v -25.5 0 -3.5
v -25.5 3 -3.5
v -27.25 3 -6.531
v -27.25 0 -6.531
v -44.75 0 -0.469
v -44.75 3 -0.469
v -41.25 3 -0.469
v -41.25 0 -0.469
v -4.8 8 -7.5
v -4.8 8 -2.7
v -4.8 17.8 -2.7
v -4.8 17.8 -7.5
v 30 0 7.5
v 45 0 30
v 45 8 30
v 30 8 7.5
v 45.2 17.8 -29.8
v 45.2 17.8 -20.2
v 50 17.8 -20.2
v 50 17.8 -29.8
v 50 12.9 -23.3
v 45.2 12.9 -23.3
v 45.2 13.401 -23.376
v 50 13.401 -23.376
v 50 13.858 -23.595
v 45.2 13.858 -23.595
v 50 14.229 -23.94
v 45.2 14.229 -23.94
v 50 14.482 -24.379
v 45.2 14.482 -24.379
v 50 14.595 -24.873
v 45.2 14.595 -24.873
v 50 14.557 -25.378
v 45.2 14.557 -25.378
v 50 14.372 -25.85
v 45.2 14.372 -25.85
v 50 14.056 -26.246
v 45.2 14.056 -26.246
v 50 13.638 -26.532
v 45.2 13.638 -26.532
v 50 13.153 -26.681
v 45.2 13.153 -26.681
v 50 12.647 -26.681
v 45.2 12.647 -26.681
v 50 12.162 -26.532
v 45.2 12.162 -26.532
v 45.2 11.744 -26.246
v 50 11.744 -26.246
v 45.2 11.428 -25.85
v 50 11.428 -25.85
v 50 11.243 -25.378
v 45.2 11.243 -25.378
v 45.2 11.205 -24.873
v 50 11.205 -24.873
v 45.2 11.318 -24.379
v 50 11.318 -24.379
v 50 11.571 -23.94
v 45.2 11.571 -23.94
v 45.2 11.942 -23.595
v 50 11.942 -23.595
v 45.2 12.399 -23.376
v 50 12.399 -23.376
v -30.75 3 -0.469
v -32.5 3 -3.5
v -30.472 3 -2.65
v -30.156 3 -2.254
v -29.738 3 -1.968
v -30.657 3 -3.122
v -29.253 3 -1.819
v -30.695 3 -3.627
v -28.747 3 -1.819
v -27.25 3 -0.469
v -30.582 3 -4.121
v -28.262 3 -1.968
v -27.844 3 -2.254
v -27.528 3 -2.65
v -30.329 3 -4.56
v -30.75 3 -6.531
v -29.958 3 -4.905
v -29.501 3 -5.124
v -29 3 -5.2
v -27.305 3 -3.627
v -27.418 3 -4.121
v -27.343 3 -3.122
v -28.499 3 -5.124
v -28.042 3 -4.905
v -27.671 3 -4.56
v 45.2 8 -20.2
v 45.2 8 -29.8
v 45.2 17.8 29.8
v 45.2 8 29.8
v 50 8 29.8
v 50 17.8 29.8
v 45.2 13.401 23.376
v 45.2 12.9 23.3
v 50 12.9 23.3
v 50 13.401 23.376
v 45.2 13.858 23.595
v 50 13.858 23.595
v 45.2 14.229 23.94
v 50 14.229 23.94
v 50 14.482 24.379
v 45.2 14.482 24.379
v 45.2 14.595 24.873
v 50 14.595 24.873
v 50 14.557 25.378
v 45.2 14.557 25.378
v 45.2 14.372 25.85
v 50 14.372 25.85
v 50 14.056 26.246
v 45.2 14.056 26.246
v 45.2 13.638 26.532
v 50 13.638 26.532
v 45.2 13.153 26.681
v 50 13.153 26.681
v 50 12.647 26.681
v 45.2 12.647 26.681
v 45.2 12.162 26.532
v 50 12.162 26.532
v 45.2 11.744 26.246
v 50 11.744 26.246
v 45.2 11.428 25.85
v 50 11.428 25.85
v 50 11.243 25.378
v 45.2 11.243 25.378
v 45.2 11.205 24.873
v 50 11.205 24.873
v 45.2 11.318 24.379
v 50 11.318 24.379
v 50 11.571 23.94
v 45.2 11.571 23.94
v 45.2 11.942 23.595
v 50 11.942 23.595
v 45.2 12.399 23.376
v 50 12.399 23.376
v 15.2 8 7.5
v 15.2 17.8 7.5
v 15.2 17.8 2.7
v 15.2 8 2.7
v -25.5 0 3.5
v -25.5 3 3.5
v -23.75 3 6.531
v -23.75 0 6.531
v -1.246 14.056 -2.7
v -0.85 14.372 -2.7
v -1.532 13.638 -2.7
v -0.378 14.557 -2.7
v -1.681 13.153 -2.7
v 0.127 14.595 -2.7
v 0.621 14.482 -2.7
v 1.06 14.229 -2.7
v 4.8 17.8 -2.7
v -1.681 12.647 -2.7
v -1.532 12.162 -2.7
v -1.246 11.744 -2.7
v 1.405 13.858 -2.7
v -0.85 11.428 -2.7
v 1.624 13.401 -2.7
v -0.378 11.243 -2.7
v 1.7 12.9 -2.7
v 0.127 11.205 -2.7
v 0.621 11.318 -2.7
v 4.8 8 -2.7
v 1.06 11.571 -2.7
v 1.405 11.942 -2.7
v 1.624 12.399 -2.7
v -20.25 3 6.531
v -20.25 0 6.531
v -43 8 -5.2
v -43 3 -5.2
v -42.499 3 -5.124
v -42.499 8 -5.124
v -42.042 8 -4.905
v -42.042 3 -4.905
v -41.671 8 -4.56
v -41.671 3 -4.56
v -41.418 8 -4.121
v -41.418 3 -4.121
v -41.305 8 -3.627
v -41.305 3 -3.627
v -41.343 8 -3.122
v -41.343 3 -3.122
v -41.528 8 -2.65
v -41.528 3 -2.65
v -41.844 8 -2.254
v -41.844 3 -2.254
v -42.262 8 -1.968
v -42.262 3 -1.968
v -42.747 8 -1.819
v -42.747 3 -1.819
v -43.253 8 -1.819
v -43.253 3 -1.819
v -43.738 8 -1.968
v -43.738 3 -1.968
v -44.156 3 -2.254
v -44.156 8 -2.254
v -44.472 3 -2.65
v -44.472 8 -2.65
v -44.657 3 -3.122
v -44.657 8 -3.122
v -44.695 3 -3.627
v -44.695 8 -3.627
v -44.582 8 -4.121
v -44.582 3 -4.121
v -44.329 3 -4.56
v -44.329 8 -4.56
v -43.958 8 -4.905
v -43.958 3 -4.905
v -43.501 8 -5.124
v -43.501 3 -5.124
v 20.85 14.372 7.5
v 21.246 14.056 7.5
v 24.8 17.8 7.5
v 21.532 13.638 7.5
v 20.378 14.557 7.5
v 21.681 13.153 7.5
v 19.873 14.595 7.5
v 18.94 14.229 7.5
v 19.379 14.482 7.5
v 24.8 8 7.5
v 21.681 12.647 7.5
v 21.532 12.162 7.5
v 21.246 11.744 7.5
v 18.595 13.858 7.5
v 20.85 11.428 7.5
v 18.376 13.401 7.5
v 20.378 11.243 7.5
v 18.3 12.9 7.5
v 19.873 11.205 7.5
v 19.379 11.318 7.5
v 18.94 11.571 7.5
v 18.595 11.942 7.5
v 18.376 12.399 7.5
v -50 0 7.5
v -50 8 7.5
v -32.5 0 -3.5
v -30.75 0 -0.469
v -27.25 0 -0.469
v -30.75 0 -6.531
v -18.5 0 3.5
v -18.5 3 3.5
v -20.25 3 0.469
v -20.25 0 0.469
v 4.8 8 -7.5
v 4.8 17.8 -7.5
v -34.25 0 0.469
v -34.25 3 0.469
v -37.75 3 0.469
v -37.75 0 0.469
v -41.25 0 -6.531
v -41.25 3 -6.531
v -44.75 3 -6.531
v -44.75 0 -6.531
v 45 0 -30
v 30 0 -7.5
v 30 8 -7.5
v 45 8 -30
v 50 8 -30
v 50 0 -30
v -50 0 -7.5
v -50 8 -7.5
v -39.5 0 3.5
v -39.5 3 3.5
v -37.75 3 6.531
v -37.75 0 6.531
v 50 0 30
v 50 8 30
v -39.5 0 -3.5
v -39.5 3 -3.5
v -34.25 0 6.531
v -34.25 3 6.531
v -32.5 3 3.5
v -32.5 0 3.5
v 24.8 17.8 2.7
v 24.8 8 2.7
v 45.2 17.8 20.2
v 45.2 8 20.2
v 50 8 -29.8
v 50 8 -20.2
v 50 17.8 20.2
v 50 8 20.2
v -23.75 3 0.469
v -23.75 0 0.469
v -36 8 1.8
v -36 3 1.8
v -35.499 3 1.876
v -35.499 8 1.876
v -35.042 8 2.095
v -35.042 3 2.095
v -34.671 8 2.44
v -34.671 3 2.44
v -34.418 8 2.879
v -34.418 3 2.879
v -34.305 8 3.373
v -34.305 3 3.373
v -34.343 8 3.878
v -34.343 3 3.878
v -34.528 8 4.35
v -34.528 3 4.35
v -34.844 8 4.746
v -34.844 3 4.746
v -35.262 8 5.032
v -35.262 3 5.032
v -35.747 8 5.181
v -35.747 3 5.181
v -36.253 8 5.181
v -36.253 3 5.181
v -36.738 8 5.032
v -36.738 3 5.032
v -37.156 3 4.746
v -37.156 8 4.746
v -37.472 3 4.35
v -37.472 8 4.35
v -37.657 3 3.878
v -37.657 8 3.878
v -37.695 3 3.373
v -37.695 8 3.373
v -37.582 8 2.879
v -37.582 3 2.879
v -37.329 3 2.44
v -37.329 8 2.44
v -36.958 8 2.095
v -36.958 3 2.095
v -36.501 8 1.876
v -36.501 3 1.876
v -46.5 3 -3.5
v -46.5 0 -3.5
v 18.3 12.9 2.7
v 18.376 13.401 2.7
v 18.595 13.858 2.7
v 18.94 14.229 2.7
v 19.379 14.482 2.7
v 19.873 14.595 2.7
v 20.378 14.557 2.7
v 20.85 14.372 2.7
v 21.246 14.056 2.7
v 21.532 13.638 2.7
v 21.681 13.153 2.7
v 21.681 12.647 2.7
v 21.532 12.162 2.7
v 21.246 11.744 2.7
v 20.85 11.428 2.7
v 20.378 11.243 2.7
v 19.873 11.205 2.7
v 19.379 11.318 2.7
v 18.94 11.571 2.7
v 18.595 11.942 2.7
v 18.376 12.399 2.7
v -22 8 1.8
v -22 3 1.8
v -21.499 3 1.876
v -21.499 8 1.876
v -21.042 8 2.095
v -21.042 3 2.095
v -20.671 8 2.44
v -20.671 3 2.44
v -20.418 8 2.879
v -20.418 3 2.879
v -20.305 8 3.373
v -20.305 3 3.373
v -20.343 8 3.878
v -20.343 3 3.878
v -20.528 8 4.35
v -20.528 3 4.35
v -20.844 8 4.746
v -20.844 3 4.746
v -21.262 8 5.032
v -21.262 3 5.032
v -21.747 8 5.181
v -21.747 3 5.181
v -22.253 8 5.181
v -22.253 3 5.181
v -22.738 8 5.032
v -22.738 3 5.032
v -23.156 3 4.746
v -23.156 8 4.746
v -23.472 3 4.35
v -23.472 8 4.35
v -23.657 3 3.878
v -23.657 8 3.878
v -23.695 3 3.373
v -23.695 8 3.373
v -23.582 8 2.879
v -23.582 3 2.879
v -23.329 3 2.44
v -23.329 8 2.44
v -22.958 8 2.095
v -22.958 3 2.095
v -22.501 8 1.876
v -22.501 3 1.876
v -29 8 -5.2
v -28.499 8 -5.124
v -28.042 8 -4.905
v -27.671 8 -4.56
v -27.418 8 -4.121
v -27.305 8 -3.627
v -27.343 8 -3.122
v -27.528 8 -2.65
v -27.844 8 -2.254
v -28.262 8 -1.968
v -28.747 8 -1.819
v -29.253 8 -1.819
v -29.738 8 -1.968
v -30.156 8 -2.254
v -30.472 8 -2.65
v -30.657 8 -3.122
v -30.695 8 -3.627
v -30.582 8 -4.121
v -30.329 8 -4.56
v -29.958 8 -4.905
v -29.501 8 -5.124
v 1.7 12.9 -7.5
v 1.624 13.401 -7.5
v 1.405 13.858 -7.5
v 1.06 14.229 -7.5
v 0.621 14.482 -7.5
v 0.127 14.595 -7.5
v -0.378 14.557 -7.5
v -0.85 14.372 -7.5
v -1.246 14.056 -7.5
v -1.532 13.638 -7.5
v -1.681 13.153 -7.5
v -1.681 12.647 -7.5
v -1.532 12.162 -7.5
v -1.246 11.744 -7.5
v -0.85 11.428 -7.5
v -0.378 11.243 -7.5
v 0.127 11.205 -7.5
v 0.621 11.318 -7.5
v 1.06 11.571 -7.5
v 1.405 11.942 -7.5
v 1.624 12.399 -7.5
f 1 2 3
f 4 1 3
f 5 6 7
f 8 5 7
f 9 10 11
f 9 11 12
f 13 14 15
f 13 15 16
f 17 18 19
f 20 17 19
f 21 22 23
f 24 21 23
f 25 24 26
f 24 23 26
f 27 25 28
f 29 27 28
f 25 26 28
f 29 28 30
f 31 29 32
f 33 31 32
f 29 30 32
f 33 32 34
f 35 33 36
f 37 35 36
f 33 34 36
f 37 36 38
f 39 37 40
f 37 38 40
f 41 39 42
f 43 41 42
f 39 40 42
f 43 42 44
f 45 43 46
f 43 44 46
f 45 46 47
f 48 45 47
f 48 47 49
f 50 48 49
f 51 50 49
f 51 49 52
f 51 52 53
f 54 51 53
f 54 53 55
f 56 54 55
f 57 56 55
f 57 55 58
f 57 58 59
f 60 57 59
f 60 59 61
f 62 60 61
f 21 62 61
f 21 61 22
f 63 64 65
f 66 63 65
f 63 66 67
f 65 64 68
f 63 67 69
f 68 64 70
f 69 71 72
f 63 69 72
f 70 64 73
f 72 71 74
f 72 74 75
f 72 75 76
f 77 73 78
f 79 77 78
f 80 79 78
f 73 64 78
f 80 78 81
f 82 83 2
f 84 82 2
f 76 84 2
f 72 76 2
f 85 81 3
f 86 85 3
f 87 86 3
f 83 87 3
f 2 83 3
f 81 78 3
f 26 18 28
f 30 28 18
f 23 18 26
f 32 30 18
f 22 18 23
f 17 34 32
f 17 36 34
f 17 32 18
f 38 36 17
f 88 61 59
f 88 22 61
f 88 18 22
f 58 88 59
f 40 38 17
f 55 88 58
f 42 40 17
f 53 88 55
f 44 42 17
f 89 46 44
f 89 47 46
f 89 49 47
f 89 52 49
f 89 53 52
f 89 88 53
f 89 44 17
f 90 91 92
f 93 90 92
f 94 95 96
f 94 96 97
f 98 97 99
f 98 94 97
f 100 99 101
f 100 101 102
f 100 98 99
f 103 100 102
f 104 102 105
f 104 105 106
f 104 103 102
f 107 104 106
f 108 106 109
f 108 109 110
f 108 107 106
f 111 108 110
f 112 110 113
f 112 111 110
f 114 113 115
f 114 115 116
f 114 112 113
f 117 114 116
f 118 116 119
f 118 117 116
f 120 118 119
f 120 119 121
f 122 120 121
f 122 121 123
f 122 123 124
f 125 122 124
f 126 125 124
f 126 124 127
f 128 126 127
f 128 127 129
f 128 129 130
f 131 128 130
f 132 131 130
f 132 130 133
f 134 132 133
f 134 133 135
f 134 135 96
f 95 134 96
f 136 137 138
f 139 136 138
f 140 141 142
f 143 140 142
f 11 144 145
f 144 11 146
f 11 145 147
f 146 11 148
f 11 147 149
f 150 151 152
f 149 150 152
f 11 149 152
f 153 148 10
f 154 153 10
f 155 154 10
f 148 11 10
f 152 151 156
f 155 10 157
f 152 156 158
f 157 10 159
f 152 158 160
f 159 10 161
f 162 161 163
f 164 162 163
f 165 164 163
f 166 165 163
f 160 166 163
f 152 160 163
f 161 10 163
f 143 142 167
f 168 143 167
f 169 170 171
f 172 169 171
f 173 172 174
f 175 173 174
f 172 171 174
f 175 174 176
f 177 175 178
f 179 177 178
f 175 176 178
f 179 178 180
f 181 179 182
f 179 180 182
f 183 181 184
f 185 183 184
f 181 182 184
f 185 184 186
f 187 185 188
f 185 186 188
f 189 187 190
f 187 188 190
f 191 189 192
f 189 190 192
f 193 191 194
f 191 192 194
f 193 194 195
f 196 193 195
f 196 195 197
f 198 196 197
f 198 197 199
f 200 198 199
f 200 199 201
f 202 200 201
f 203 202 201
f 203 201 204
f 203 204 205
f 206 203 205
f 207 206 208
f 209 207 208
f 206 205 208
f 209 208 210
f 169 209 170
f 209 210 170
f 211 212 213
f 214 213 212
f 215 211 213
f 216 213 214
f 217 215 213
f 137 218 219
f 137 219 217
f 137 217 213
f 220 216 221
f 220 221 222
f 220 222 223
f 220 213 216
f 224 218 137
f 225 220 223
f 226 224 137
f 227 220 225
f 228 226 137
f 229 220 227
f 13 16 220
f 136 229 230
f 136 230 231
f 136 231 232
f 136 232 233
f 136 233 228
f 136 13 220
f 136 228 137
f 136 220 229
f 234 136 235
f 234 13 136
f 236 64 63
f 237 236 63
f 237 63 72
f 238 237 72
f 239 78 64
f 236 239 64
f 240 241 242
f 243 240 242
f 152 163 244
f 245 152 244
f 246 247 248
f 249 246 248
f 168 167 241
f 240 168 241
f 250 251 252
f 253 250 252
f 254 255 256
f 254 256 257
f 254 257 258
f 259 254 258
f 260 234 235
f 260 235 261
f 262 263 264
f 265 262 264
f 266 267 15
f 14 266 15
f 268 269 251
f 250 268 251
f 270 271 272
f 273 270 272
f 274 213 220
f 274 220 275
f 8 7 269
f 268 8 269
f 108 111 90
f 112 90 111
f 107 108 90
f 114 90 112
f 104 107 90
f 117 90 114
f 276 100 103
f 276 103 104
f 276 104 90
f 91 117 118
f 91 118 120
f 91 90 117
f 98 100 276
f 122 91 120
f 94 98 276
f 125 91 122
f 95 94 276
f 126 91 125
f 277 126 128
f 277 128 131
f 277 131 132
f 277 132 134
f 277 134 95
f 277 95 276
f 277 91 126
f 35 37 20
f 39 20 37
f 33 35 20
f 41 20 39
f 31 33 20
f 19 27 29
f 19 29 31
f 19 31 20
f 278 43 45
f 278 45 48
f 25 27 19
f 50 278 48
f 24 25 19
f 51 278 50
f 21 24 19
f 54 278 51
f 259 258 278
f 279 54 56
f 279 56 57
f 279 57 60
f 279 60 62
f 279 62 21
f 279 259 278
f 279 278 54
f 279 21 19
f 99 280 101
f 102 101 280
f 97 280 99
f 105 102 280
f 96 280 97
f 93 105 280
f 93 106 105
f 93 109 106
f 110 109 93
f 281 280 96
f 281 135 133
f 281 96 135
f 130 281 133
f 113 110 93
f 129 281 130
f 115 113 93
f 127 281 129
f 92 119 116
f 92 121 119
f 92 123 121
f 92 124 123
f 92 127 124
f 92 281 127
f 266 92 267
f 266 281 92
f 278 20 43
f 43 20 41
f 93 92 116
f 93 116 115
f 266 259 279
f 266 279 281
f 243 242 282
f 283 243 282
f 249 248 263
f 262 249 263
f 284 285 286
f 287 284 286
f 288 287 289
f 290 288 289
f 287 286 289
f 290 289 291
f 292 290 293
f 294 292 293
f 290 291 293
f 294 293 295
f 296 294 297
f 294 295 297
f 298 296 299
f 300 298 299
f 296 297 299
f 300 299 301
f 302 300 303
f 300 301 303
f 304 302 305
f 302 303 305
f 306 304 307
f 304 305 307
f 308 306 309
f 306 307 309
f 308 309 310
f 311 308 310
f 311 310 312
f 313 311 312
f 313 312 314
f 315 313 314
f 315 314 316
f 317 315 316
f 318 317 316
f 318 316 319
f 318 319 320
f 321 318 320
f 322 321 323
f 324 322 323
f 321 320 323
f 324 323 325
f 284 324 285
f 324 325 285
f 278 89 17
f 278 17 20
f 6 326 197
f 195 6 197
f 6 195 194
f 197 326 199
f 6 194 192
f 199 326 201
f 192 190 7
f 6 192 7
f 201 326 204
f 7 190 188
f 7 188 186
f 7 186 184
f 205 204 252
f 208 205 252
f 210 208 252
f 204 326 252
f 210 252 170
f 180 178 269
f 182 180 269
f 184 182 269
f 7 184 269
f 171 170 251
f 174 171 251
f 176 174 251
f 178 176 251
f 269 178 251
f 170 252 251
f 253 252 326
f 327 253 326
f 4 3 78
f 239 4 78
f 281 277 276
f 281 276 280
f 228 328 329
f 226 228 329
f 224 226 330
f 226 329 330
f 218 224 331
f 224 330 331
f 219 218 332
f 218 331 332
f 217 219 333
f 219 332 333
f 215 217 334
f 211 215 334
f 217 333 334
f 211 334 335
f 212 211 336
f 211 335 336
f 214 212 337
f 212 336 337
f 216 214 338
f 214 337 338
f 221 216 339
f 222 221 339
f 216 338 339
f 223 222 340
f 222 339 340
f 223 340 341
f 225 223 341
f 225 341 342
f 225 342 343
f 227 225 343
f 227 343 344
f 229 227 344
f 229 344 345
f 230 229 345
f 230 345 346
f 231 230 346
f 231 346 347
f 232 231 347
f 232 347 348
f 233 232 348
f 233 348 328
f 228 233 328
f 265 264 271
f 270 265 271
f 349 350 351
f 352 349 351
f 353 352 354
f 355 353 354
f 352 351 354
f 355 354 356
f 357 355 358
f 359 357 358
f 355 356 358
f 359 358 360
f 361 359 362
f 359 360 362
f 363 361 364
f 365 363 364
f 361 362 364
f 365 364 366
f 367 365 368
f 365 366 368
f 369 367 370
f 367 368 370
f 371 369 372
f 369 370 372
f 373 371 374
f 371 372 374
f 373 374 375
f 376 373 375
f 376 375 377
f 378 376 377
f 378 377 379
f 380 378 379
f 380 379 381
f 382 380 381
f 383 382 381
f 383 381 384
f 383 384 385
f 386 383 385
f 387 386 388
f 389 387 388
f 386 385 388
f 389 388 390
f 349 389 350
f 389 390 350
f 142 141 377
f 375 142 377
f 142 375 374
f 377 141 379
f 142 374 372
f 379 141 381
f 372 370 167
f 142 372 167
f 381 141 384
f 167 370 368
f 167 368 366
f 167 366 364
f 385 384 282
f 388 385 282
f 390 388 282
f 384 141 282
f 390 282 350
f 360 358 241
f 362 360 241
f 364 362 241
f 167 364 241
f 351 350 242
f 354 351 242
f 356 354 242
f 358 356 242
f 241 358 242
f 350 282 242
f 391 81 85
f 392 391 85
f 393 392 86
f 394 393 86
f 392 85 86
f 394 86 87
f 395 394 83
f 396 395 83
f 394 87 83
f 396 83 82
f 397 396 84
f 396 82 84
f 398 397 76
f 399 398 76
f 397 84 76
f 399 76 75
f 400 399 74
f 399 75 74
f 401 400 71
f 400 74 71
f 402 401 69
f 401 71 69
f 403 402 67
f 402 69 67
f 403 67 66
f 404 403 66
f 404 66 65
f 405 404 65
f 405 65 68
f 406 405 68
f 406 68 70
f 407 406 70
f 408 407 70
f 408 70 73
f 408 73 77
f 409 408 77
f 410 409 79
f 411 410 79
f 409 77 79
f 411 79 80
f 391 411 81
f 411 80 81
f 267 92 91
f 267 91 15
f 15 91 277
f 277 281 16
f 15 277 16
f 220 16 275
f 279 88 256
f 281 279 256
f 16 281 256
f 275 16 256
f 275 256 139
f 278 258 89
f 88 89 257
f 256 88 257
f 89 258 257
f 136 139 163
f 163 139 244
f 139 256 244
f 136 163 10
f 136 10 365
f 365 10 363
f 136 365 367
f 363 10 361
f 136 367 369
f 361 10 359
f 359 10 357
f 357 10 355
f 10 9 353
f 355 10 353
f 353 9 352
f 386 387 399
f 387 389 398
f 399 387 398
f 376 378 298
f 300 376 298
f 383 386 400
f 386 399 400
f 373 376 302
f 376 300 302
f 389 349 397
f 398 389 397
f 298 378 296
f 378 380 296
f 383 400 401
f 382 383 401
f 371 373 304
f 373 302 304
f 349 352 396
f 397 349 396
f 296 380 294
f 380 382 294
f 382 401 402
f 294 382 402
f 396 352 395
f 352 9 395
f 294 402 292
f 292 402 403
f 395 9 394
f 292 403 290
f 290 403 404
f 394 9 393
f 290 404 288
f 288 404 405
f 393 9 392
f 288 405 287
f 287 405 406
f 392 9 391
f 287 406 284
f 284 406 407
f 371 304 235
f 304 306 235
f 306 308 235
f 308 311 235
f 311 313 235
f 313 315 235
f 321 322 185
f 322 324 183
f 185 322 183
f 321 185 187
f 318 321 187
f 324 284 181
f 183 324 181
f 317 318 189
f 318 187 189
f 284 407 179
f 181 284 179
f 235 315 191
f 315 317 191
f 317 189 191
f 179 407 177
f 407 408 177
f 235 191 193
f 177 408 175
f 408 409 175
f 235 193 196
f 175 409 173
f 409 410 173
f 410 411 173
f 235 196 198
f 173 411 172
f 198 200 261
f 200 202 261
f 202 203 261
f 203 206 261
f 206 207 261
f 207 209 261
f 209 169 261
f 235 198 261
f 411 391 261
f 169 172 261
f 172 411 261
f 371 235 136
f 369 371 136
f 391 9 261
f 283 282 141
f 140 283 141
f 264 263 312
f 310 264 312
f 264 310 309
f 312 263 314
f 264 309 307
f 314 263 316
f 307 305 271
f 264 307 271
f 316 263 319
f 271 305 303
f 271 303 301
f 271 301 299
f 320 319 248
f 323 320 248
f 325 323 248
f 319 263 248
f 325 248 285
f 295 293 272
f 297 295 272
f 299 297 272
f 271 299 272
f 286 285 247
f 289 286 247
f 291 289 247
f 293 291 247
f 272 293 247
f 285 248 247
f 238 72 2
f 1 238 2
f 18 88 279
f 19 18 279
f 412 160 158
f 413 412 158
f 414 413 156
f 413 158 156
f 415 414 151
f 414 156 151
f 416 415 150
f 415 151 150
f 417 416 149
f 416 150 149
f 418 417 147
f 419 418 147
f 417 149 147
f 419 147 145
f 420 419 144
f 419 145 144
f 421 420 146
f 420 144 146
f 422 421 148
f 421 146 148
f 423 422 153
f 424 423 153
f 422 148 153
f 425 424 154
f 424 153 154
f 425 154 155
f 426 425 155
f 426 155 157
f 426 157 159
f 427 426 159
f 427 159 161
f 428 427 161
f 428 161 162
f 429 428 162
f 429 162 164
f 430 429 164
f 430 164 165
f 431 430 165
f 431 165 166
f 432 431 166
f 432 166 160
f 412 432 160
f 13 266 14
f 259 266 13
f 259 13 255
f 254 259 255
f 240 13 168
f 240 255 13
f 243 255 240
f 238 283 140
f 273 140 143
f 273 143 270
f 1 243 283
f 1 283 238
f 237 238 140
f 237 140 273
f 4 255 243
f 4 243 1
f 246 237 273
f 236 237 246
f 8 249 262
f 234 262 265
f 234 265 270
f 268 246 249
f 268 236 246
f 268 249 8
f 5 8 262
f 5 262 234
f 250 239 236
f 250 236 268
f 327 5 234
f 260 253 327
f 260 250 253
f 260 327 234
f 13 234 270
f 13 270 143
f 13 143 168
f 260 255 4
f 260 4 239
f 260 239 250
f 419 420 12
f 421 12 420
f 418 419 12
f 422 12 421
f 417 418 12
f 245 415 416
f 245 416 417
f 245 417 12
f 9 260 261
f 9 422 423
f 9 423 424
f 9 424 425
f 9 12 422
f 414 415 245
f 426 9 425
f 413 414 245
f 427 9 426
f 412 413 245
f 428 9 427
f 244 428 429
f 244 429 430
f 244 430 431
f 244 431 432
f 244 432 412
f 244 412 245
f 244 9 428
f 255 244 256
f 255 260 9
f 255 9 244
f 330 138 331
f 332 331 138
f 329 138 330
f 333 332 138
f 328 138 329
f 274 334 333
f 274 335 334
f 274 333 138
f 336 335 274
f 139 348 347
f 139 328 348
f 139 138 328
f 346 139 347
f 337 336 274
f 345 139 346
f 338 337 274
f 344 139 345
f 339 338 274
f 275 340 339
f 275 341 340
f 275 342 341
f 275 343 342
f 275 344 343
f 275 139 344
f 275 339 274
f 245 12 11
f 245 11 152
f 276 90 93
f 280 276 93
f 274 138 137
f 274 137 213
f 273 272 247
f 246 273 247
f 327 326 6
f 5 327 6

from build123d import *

# Parameters (mm, degrees)
BOSS_EXTRUDE1_DEPTH = 8
SKETCH2_W           = 4.8
SKETCH2_H           = 9.6
SKETCH2_W_2         = 9.6
SKETCH2_H_2         = 4.8
BOSS_EXTRUDE2_DEPTH = 9.8
CUT_EXTRUDE1_REACH  = 103.39
SKETCH3_R           = 1.7
CUT_EXTRUDE2_REACH  = 64.339
SKETCH4_R           = 1.7
CUT_EXTRUDE3_REACH  = 64.339
SKETCH5_R           = 1.7
CUT_EXTRUDE4_START  = -5
CUT_EXTRUDE4_DEPTH  = 3
SKETCH10_R          = 1.7
CUT_EXTRUDE7_DEPTH  = 5
LPATTERN2_COUNT     = 2
LPATTERN2_PITCH     = 14


with BuildPart() as part:
    # Sketch1 → Boss-Extrude1 (new body)
    with BuildSketch(Plane(origin=(0, 0, 0), x_dir=(1, 0, 0), z_dir=(0, 1, 0))):
        Polygon((50, 30), (50, -30), (45, -30), (30, -7.5), (-50, -7.5), (-50, 7.5), (30, 7.5), (45, 30), align=None)
    extrude(amount=BOSS_EXTRUDE1_DEPTH)

    # Sketch2 → Boss-Extrude2 (add)
    with BuildSketch(Plane(origin=(0, 8, 0), x_dir=(1, 0, 0), z_dir=(0, 1, 0))):
        with Locations((47.6, 25)):
            Rectangle(SKETCH2_W, SKETCH2_H)
        with Locations((47.6, -25)):
            Rectangle(SKETCH2_W, SKETCH2_H)
        with Locations((20, -5.1)):
            Rectangle(SKETCH2_W_2, SKETCH2_H_2)
        with Locations((0, 5.1)):
            Rectangle(SKETCH2_W_2, SKETCH2_H_2)
    extrude(amount=BOSS_EXTRUDE2_DEPTH)

    # Sketch3 → Cut-Extrude1 (cut, up to next)
    with BuildSketch(Plane.ZY.offset(-45.2), mode=Mode.PRIVATE) as cut_extrude1_sk1:
        with Locations((-25, 12.9)):
            Circle(SKETCH3_R)
    cut_extrude1_tool1 = extrude(cut_extrude1_sk1.sketch, amount=-CUT_EXTRUDE1_REACH, mode=Mode.PRIVATE) & part.part
    cut_extrude1 = cut_extrude1_tool1.solids().sort_by_distance((45.2, 12.9, -25))[0]
    add(cut_extrude1, mode=Mode.SUBTRACT)

    # Mirror1: Cut-Extrude1 across plane
    add(cut_extrude1.mirror(Plane.XY), mode=Mode.SUBTRACT)

    # Sketch4 → Cut-Extrude2 (cut, up to next)
    with BuildSketch(Plane(origin=(0, 0, 2.7), x_dir=(-1, 0, 0), z_dir=(0, 0, -1)), mode=Mode.PRIVATE) as cut_extrude2_sk1:
        with Locations((-20, 12.9)):
            Circle(SKETCH4_R)
    cut_extrude2_tool1 = extrude(cut_extrude2_sk1.sketch, amount=-CUT_EXTRUDE2_REACH, mode=Mode.PRIVATE) & part.part
    add(cut_extrude2_tool1.solids().sort_by_distance((20, 12.9, 2.7))[0], mode=Mode.SUBTRACT)

    # Sketch5 → Cut-Extrude3 (cut, up to next)
    with BuildSketch(Plane.XY.offset(-2.7), mode=Mode.PRIVATE) as cut_extrude3_sk1:
        with Locations((0, 12.9)):
            Circle(SKETCH5_R)
    cut_extrude3_tool1 = extrude(cut_extrude3_sk1.sketch, amount=-CUT_EXTRUDE3_REACH, mode=Mode.PRIVATE) & part.part
    add(cut_extrude3_tool1.solids().sort_by_distance((0, 12.9, -2.7))[0], mode=Mode.SUBTRACT)

    # Sketch7 → Cut-Extrude4 (cut)
    with BuildSketch(Plane(origin=(0, 8, 0), x_dir=(1, 0, 0), z_dir=(0, 1, 0)).offset(CUT_EXTRUDE4_START)):
        Polygon((-46.5, 3.5), (-44.75, 0.468911087), (-41.25, 0.468911087), (-39.5, 3.5), (-41.25, 6.531088913), (-44.75, 6.531088913), align=None)
        Polygon((-32.5, -3.5), (-34.25, -0.468911087), (-37.75, -0.468911087), (-39.5, -3.5), (-37.75, -6.531088913), (-34.25, -6.531088913), align=None)
    cut_extrude4 = extrude(amount=-CUT_EXTRUDE4_DEPTH, mode=Mode.SUBTRACT)

    # Sketch10 → Cut-Extrude7 (cut)
    with BuildSketch(Plane.XZ.offset(-3)):
        with Locations(Location((-43, -3.5, 0), (0, 0, 270))):
            Circle(SKETCH10_R)
        with Locations(Location((-36, 3.5, 0), (0, 0, 270))):
            Circle(SKETCH10_R)
    cut_extrude7 = extrude(amount=-CUT_EXTRUDE7_DEPTH, mode=Mode.SUBTRACT)

    # LPattern2: Cut-Extrude4, Cut-Extrude7 ×2
    with Locations(*[(i * LPATTERN2_PITCH, 0, 0) for i in range(1, LPATTERN2_COUNT)]):
        add(cut_extrude4, mode=Mode.SUBTRACT)
        add(cut_extrude7, mode=Mode.SUBTRACT)


solid = part.part
